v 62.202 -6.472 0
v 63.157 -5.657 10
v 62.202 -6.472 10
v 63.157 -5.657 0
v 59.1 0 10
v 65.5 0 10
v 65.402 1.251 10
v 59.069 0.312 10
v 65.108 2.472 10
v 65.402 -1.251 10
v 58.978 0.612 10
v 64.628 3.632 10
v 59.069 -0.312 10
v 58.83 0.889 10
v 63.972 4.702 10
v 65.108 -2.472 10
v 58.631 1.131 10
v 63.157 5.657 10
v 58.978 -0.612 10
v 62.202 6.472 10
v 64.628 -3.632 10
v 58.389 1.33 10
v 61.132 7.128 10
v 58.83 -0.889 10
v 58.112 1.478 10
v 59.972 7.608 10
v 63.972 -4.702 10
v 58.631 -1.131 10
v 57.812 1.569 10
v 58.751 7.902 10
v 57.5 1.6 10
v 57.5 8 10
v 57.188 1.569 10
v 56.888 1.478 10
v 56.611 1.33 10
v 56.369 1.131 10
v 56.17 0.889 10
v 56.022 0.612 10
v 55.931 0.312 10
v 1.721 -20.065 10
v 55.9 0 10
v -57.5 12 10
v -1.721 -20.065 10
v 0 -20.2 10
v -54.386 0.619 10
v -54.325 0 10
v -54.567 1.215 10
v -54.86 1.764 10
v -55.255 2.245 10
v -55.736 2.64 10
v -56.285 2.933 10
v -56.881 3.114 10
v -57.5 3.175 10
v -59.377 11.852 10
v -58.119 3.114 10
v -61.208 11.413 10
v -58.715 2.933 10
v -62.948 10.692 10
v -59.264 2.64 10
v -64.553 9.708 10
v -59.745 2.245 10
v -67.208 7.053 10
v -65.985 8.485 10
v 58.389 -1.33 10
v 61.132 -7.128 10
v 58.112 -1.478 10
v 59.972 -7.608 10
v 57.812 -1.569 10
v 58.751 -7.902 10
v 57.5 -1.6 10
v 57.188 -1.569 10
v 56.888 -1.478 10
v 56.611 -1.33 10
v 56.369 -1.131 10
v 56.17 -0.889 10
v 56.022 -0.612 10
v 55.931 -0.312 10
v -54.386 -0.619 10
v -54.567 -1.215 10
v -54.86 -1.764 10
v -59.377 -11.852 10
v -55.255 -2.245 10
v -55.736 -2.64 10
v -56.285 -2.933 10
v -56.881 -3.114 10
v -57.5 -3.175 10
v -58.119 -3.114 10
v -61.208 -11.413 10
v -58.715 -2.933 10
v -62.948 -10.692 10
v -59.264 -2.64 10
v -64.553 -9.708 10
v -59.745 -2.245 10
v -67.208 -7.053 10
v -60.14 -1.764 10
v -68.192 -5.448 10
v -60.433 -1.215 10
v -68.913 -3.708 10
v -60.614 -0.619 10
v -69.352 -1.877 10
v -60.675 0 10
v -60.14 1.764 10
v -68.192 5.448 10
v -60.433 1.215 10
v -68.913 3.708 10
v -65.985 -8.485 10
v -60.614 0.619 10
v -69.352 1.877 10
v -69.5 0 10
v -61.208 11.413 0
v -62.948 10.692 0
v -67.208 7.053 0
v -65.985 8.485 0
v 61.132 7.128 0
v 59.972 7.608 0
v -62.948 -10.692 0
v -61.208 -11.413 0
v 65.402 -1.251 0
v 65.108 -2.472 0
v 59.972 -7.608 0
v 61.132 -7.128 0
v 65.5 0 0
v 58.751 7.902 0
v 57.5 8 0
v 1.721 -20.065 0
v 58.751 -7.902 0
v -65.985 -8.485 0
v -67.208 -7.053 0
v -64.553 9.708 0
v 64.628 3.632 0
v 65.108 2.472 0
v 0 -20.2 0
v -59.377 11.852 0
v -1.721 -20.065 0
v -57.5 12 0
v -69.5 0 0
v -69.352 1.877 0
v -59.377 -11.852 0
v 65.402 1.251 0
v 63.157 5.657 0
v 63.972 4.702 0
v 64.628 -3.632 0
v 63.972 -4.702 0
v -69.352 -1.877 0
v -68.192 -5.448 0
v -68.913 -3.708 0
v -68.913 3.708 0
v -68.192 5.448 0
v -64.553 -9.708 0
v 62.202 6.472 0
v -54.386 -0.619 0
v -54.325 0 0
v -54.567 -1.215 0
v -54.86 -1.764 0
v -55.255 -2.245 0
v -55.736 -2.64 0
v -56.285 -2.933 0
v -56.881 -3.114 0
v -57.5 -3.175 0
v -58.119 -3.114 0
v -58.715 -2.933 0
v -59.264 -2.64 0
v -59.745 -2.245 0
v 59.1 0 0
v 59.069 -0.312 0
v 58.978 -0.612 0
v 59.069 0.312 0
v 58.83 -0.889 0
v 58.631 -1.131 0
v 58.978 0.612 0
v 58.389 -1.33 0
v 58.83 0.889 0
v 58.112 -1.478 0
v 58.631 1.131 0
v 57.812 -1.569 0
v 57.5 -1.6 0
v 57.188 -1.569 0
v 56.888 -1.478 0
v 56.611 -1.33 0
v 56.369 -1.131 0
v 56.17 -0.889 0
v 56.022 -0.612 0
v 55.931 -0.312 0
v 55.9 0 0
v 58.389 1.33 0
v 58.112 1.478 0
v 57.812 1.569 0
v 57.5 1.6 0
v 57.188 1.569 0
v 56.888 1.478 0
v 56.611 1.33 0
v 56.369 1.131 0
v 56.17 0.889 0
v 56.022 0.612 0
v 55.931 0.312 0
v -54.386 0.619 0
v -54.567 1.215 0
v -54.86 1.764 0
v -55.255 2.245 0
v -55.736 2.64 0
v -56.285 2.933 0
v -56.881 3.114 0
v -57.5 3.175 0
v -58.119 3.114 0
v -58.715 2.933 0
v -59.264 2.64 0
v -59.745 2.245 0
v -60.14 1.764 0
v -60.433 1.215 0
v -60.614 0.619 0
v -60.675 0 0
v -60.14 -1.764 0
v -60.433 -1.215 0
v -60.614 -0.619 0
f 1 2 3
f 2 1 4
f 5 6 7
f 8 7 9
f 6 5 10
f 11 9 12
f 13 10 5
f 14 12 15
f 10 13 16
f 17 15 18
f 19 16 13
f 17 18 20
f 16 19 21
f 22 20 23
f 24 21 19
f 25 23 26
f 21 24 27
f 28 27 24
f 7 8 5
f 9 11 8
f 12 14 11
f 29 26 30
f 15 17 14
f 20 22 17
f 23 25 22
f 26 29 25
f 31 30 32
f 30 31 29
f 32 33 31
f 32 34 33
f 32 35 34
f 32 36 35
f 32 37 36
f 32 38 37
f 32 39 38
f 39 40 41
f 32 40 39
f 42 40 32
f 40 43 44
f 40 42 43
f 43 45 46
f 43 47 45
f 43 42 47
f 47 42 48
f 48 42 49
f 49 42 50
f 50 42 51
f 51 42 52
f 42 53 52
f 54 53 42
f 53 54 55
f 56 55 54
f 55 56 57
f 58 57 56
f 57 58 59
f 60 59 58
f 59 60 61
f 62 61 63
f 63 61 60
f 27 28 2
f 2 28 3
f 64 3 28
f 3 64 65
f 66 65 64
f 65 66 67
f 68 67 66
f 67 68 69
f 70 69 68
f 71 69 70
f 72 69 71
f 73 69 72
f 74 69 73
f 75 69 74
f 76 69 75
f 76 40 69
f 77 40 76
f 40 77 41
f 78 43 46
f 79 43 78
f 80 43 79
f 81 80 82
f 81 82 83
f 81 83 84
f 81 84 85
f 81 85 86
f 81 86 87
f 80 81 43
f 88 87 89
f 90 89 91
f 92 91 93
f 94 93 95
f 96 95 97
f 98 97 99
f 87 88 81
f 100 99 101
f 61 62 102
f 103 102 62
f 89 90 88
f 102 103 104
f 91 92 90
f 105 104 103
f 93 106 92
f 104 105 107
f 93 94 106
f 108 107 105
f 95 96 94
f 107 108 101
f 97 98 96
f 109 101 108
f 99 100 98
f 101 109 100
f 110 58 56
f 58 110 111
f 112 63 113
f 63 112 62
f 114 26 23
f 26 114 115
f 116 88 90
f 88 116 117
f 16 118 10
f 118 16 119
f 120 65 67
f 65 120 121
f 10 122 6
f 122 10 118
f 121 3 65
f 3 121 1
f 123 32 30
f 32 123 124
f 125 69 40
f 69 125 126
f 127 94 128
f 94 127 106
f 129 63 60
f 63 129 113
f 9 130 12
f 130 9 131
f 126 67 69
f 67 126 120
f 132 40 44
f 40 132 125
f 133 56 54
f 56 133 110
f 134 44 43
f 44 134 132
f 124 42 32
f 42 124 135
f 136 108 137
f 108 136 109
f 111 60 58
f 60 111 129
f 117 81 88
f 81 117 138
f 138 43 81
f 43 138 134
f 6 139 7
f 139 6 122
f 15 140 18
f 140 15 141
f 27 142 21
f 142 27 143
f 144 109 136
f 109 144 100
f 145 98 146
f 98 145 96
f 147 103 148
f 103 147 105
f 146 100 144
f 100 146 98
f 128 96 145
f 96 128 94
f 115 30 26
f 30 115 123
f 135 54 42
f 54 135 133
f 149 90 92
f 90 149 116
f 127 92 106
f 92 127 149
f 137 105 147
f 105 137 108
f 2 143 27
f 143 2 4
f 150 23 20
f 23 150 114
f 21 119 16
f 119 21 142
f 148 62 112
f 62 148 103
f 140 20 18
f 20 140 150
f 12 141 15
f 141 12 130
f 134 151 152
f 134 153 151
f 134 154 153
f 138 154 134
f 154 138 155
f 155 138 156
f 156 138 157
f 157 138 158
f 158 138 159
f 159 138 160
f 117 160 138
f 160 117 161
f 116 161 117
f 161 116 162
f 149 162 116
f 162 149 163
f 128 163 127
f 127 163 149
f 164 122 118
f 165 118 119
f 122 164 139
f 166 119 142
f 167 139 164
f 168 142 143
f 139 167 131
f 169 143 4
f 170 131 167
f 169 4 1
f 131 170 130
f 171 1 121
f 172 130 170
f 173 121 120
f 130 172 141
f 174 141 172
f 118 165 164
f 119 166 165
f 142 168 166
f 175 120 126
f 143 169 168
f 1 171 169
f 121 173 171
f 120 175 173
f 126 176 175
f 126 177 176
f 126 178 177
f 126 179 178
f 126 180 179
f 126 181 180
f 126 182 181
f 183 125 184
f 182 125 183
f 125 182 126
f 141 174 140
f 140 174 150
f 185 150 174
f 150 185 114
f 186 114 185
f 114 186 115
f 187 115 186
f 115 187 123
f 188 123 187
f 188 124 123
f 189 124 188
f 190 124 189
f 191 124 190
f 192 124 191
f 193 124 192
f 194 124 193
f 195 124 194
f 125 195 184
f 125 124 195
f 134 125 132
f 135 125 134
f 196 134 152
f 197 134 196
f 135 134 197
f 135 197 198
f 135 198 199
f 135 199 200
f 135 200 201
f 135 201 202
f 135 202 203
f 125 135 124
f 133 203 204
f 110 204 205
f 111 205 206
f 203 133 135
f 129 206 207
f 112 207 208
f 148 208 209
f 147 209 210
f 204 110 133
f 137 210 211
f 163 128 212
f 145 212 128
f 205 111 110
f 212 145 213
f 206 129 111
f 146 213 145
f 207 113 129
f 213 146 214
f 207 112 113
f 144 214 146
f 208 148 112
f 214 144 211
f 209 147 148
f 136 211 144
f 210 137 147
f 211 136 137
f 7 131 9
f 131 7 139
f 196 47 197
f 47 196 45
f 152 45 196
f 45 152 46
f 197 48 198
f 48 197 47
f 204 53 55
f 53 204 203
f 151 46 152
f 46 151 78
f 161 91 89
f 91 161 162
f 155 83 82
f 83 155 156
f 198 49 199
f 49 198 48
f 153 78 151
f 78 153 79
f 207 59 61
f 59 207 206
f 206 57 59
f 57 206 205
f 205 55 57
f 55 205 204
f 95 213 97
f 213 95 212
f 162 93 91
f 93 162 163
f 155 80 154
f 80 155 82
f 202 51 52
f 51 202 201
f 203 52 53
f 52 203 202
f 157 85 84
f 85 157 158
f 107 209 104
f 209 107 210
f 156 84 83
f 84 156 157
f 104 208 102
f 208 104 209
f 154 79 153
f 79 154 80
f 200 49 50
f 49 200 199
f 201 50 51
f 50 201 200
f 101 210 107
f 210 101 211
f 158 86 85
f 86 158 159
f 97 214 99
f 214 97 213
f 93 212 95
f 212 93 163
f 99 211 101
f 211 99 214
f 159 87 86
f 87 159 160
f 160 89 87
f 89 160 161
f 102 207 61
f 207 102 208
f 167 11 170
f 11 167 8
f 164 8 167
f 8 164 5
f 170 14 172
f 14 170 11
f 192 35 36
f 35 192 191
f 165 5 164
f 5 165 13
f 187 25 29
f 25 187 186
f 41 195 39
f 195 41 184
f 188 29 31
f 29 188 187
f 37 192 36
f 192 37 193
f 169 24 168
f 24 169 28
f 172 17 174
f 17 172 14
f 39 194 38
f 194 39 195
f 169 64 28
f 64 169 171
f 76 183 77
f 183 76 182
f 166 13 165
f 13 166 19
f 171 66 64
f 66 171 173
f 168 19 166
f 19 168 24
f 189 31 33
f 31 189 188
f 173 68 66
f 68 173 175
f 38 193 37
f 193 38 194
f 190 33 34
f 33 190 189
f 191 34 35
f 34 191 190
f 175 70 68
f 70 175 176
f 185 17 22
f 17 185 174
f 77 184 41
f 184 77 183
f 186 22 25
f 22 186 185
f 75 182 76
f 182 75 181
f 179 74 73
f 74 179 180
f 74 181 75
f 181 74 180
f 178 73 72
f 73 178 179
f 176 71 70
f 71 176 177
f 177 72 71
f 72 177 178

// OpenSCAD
$fn = 32;

// ----------------------------------------------------------------------
// Lever: 115 mm between the bosses, 10 mm thick, smooth outline
// ----------------------------------------------------------------------

// --- parameters (mm) ---
lever_l = 115;            // distance between the boss centres
boss_a = 24;              // first boss diameter
boss_b = 16;              // second boss diameter
bore_a = 6.35;            // first bore
bore_b = 3.2;             // second bore
lever_t = 10;             // lever thickness
boss_c = 22;              // middle boss diameter
bend = 9.2;               // how far the middle boss drops

lever_profile = [[-69.5, 0], [-69.352, -1.877], [-68.913, -3.708], [-68.192, -5.448], [-67.208, -7.053], [-65.985, -8.485], [-64.553, -9.708], [-62.948, -10.692], [-61.208, -11.413], [-59.377, -11.852], [-1.721, -20.065], [0, -20.2], [1.721, -20.065], [58.751, -7.902], [59.972, -7.608], [61.132, -7.128], [62.202, -6.472], [63.157, -5.657], [63.972, -4.702], [64.628, -3.632], [65.108, -2.472], [65.402, -1.251], [65.5, 0], [65.402, 1.251], [65.108, 2.472], [64.628, 3.632], [63.972, 4.702], [63.157, 5.657], [62.202, 6.472], [61.132, 7.128], [59.972, 7.608], [58.751, 7.902], [57.5, 8], [-57.5, 12], [-59.377, 11.852], [-61.208, 11.413], [-62.948, 10.692], [-64.553, 9.708], [-65.985, 8.485], [-67.208, 7.053], [-68.192, 5.448], [-68.913, 3.708], [-69.352, 1.877]];

difference() {
  linear_extrude(height = lever_t) polygon(lever_profile);
  translate([-57.5, 0, -2.5]) cylinder(h = lever_t + 5, d = bore_a);
  translate([57.5, 0, -2.5]) cylinder(h = lever_t + 5, d = bore_b);
}
